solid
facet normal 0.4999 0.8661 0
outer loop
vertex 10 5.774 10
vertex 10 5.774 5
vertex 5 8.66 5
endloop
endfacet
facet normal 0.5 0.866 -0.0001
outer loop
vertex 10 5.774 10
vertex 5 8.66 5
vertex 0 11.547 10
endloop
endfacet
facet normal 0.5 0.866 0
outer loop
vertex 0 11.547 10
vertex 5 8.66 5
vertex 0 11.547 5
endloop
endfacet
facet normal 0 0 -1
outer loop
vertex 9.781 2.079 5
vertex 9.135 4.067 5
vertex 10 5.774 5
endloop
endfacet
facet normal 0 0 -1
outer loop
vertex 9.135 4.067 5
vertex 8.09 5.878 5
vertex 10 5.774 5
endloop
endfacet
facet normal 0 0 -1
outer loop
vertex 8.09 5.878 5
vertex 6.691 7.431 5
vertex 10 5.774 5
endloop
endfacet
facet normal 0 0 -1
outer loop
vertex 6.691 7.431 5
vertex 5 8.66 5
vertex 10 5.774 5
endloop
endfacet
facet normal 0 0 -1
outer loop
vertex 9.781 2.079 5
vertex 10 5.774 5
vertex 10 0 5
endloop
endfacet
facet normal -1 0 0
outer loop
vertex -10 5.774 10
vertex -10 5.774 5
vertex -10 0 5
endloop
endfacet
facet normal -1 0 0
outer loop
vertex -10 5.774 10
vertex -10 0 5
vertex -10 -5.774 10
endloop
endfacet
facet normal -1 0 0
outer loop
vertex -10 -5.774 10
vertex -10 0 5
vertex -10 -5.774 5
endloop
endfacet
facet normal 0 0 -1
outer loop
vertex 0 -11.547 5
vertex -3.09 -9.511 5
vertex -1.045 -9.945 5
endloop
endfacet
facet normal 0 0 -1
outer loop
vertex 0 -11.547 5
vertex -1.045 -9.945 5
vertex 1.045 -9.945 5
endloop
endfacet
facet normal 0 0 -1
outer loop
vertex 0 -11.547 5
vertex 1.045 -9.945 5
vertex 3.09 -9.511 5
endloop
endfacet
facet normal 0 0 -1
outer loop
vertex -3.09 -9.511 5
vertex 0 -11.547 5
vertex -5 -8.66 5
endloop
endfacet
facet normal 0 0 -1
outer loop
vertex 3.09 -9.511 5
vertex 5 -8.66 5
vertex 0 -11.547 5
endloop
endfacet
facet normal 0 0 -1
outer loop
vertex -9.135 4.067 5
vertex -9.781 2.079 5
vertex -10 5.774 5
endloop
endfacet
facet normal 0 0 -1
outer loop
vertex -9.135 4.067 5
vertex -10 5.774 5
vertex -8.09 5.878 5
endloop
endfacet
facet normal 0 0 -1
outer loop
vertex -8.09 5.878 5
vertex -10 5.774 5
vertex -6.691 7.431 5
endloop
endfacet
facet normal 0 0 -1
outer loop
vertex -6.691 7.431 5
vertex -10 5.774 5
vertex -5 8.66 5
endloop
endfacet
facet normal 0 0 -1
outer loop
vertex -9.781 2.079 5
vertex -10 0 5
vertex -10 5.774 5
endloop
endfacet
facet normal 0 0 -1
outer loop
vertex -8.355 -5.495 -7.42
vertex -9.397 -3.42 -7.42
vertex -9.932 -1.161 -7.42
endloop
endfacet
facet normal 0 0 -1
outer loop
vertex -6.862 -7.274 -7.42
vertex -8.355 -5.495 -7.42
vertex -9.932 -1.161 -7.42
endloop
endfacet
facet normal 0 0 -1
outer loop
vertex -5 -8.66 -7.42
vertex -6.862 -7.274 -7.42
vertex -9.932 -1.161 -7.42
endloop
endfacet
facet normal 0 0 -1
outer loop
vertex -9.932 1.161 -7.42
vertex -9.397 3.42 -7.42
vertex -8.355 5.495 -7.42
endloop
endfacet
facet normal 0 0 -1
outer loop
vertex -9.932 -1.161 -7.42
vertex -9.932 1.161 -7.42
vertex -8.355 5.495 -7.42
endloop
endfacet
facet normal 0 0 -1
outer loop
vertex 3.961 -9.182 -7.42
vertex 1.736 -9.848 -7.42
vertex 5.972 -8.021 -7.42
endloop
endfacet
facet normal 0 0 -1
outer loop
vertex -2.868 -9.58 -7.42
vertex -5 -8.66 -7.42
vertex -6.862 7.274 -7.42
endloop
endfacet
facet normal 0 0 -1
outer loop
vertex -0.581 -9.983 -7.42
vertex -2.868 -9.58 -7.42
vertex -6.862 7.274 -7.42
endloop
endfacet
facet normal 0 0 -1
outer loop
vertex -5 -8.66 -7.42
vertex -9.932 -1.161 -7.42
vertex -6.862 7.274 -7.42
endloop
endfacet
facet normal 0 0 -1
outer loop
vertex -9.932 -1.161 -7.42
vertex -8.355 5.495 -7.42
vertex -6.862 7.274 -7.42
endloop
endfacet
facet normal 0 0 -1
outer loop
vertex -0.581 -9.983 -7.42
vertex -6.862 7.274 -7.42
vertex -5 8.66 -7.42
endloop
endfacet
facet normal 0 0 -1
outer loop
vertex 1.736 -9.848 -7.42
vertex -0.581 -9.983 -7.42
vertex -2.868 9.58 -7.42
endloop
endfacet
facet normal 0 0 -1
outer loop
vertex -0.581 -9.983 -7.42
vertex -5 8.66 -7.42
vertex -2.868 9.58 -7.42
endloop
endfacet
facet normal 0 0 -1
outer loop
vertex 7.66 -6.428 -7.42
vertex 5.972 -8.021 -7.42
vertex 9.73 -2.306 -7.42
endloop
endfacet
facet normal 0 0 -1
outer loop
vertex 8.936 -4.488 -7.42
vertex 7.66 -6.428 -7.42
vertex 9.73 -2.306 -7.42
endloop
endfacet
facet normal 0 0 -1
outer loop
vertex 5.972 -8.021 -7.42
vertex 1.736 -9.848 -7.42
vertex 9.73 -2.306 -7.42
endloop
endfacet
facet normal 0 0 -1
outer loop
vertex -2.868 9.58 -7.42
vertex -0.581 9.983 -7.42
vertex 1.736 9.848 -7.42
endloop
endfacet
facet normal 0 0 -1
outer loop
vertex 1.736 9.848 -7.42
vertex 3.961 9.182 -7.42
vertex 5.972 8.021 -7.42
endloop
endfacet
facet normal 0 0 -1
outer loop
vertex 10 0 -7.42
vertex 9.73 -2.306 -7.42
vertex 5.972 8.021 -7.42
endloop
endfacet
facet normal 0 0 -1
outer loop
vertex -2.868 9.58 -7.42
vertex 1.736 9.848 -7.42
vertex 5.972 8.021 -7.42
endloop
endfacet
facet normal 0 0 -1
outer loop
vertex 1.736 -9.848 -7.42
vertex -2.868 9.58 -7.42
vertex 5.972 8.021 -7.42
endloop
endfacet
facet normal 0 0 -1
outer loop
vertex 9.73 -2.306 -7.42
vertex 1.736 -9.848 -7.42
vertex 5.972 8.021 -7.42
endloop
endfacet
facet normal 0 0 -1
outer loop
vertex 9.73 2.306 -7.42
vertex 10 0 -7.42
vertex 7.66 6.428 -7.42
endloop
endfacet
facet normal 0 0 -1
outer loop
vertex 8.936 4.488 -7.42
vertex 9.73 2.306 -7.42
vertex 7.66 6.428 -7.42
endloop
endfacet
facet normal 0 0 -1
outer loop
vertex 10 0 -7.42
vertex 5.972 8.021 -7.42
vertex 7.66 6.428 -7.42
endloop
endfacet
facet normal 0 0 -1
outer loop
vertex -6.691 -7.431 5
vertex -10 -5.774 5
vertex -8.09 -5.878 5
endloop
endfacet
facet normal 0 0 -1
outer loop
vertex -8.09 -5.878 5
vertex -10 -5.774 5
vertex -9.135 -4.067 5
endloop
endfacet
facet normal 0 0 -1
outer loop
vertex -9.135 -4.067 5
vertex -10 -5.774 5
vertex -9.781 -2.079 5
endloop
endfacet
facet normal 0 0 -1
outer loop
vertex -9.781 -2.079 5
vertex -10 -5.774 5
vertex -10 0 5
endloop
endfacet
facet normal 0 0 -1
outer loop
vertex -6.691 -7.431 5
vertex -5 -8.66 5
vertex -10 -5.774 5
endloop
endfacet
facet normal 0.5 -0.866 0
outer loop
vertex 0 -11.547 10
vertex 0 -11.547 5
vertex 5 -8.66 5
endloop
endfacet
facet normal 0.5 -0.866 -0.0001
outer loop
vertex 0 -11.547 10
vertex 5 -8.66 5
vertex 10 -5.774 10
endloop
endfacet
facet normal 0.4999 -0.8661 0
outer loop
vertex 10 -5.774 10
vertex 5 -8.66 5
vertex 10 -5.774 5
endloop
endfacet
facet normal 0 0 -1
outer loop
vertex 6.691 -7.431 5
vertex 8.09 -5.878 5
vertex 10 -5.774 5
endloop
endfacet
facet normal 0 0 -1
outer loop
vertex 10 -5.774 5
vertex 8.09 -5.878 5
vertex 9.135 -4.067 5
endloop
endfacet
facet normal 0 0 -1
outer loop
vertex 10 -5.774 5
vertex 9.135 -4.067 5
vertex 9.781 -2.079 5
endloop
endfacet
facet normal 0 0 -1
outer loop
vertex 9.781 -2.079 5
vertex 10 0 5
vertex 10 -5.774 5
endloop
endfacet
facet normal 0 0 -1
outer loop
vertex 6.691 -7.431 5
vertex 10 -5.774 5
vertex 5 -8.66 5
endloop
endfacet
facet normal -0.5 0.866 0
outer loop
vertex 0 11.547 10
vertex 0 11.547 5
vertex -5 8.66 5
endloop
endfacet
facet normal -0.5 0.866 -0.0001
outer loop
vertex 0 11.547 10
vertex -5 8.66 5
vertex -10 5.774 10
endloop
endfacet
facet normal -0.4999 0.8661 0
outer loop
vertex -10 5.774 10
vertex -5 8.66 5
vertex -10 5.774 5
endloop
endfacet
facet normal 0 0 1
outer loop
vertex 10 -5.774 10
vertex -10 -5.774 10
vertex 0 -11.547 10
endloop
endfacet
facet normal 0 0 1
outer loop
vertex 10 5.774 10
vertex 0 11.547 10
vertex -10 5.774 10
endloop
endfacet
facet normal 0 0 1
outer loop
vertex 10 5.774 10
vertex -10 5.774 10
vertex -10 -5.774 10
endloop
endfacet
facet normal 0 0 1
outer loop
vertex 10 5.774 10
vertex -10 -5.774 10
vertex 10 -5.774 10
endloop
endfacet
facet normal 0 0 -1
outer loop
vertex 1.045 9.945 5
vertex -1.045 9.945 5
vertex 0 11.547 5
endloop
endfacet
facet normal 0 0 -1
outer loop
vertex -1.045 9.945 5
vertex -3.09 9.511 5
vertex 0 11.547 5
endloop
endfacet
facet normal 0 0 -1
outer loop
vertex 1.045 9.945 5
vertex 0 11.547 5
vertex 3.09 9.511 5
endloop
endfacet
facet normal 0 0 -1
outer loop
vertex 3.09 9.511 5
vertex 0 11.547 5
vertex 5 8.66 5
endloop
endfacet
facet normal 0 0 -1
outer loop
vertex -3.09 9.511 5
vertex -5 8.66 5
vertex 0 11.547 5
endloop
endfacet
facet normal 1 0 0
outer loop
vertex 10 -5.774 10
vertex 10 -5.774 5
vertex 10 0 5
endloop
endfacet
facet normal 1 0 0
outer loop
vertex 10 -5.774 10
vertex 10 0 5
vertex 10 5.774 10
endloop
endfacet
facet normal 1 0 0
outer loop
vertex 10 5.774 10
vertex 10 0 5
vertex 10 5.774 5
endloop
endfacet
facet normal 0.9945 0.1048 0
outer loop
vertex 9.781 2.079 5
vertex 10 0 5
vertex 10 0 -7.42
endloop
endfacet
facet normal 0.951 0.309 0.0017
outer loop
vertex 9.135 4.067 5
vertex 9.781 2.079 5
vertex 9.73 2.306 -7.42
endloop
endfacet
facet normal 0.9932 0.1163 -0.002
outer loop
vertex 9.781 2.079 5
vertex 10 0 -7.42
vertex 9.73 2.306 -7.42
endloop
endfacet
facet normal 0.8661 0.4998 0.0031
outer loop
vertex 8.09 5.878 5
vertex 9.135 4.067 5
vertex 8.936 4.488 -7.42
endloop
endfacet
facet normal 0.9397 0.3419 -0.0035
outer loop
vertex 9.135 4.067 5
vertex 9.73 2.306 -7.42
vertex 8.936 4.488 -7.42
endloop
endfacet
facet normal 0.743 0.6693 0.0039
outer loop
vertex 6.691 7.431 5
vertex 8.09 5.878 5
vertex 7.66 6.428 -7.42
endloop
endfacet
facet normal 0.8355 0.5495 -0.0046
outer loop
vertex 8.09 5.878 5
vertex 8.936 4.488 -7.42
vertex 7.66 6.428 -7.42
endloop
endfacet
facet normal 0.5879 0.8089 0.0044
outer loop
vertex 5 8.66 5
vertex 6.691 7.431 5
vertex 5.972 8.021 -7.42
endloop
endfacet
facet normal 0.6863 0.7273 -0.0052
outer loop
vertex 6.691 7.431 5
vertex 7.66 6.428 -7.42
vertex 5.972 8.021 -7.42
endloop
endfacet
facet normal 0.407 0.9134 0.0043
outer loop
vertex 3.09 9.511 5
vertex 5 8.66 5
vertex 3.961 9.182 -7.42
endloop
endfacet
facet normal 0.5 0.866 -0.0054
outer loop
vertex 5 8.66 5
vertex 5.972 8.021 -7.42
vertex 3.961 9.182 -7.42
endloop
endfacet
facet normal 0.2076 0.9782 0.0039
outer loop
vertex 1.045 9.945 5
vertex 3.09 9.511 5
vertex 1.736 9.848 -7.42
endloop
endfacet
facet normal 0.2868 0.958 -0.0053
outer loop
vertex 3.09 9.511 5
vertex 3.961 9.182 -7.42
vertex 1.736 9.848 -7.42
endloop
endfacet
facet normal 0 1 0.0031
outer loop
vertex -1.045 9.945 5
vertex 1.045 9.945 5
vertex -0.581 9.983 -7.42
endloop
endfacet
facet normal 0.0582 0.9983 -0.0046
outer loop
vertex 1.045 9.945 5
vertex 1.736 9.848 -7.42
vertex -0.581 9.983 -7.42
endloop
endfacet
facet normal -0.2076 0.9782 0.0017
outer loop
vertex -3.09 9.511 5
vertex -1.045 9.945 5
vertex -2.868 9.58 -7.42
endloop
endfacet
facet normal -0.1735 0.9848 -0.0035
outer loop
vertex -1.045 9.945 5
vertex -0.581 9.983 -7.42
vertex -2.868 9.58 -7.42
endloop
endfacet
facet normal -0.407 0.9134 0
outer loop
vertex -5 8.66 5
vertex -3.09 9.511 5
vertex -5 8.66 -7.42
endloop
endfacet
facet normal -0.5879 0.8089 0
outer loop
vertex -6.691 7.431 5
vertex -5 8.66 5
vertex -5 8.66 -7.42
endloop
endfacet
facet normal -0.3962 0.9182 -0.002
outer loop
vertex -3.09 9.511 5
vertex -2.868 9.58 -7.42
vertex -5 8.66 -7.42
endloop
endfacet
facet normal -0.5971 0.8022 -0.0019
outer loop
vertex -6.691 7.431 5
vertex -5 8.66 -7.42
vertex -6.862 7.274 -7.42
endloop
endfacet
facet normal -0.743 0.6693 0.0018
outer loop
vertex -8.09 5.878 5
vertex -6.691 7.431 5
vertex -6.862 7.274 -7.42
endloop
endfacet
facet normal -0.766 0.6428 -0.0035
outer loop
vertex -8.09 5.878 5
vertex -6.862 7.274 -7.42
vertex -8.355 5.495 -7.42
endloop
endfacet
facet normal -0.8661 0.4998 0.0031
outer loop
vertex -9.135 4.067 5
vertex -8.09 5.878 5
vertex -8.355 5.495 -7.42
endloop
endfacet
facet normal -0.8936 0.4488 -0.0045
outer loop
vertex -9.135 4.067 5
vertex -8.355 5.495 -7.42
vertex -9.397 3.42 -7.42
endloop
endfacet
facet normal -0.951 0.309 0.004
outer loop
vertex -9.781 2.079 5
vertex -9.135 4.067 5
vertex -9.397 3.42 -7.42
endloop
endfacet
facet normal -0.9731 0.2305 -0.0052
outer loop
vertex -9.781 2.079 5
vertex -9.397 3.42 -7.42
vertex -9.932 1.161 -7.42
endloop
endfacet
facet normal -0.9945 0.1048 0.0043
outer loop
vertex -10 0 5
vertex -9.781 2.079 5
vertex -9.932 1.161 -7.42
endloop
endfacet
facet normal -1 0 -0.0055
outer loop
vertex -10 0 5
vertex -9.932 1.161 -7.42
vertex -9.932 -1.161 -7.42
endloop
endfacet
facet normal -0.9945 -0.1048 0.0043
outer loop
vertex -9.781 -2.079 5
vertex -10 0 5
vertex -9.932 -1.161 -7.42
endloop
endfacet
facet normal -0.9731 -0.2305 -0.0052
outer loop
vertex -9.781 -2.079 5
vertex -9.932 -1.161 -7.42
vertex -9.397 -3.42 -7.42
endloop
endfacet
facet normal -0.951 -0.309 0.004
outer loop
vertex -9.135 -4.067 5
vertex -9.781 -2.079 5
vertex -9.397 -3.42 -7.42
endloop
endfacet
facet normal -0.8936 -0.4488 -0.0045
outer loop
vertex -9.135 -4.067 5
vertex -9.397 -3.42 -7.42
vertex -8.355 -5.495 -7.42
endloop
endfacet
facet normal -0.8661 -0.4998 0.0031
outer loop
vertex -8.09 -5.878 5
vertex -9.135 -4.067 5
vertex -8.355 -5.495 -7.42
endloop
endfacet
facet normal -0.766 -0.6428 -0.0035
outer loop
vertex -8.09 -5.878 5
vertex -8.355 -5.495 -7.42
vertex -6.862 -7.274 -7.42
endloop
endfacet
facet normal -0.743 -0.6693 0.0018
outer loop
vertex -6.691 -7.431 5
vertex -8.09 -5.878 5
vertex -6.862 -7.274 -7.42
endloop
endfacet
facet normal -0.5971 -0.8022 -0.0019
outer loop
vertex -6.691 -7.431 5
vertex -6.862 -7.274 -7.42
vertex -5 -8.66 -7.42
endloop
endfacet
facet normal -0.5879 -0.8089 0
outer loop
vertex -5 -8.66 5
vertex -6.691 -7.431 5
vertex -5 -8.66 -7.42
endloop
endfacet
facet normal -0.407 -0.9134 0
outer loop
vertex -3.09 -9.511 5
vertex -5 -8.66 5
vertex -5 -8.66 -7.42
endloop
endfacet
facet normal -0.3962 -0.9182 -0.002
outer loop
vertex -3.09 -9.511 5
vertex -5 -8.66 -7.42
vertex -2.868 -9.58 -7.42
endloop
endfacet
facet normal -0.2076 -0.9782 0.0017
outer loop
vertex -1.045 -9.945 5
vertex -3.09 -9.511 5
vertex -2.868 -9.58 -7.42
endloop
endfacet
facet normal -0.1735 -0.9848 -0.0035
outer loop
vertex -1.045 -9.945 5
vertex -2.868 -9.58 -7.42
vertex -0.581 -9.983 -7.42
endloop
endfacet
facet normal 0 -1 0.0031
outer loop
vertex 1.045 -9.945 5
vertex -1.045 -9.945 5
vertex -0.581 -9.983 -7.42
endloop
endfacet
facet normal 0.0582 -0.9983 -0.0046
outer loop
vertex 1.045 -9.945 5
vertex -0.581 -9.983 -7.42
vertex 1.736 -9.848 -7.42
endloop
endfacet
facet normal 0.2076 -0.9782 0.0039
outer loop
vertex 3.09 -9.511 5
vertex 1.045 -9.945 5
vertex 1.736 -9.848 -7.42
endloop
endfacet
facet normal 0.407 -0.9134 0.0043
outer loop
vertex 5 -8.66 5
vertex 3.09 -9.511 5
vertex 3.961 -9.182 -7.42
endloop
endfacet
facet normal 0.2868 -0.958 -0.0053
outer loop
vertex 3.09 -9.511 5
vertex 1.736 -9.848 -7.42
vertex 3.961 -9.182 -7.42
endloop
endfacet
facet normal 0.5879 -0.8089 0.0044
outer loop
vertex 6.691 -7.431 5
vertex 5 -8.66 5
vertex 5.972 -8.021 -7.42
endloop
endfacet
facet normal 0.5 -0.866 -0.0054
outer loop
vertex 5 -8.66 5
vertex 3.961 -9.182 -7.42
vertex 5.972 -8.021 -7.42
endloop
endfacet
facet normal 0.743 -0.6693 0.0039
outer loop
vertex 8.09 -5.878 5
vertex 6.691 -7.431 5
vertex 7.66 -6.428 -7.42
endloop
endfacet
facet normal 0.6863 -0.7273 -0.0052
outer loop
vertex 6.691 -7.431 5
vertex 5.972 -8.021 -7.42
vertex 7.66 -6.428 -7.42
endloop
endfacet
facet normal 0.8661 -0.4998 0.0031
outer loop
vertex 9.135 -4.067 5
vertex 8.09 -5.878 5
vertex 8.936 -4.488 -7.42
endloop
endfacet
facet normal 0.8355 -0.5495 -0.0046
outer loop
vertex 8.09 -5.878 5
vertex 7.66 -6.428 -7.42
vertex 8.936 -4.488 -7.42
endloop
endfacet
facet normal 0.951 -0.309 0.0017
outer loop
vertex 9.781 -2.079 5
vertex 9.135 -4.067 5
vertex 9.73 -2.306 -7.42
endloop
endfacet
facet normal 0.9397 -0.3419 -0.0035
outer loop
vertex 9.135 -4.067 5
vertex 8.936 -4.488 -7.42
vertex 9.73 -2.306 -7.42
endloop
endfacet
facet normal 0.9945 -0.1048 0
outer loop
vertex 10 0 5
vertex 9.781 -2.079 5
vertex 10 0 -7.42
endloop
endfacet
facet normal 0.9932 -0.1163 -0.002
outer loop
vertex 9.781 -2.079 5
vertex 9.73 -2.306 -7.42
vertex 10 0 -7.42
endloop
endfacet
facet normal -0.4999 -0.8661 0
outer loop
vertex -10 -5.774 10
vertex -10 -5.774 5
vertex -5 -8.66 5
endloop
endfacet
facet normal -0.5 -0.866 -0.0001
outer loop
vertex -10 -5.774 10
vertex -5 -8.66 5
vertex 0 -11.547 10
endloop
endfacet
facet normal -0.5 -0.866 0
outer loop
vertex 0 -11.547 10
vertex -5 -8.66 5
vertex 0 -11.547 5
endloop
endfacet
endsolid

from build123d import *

# Parameters (mm, degrees)
BOSS_EXTRUDE1_DEPTH      = 5
BOSS_EXTRUDE1_DEPTH_BACK = 7.42
SKETCH1_R                = 10
BOSS_EXTRUDE2_DEPTH      = 5


with BuildPart() as part:
    # Sketch1 → Boss-Extrude1 (new, two sides: drawn at the far end of the back side and taken through both)
    with BuildSketch(Plane.XY.offset(-BOSS_EXTRUDE1_DEPTH_BACK)):
        Circle(SKETCH1_R)
    extrude(amount=BOSS_EXTRUDE1_DEPTH + BOSS_EXTRUDE1_DEPTH_BACK)

    # Sketch2 → Boss-Extrude2 (add)
    with BuildSketch(Plane.XY.offset(5)):
        Polygon((0, 11.547005384), (-10, 5.773502692), (-10, -5.773502692), (0, -11.547005384), (10, -5.773502692), (10, 5.773502692), align=None)
    extrude(amount=BOSS_EXTRUDE2_DEPTH)


solid = part.part
